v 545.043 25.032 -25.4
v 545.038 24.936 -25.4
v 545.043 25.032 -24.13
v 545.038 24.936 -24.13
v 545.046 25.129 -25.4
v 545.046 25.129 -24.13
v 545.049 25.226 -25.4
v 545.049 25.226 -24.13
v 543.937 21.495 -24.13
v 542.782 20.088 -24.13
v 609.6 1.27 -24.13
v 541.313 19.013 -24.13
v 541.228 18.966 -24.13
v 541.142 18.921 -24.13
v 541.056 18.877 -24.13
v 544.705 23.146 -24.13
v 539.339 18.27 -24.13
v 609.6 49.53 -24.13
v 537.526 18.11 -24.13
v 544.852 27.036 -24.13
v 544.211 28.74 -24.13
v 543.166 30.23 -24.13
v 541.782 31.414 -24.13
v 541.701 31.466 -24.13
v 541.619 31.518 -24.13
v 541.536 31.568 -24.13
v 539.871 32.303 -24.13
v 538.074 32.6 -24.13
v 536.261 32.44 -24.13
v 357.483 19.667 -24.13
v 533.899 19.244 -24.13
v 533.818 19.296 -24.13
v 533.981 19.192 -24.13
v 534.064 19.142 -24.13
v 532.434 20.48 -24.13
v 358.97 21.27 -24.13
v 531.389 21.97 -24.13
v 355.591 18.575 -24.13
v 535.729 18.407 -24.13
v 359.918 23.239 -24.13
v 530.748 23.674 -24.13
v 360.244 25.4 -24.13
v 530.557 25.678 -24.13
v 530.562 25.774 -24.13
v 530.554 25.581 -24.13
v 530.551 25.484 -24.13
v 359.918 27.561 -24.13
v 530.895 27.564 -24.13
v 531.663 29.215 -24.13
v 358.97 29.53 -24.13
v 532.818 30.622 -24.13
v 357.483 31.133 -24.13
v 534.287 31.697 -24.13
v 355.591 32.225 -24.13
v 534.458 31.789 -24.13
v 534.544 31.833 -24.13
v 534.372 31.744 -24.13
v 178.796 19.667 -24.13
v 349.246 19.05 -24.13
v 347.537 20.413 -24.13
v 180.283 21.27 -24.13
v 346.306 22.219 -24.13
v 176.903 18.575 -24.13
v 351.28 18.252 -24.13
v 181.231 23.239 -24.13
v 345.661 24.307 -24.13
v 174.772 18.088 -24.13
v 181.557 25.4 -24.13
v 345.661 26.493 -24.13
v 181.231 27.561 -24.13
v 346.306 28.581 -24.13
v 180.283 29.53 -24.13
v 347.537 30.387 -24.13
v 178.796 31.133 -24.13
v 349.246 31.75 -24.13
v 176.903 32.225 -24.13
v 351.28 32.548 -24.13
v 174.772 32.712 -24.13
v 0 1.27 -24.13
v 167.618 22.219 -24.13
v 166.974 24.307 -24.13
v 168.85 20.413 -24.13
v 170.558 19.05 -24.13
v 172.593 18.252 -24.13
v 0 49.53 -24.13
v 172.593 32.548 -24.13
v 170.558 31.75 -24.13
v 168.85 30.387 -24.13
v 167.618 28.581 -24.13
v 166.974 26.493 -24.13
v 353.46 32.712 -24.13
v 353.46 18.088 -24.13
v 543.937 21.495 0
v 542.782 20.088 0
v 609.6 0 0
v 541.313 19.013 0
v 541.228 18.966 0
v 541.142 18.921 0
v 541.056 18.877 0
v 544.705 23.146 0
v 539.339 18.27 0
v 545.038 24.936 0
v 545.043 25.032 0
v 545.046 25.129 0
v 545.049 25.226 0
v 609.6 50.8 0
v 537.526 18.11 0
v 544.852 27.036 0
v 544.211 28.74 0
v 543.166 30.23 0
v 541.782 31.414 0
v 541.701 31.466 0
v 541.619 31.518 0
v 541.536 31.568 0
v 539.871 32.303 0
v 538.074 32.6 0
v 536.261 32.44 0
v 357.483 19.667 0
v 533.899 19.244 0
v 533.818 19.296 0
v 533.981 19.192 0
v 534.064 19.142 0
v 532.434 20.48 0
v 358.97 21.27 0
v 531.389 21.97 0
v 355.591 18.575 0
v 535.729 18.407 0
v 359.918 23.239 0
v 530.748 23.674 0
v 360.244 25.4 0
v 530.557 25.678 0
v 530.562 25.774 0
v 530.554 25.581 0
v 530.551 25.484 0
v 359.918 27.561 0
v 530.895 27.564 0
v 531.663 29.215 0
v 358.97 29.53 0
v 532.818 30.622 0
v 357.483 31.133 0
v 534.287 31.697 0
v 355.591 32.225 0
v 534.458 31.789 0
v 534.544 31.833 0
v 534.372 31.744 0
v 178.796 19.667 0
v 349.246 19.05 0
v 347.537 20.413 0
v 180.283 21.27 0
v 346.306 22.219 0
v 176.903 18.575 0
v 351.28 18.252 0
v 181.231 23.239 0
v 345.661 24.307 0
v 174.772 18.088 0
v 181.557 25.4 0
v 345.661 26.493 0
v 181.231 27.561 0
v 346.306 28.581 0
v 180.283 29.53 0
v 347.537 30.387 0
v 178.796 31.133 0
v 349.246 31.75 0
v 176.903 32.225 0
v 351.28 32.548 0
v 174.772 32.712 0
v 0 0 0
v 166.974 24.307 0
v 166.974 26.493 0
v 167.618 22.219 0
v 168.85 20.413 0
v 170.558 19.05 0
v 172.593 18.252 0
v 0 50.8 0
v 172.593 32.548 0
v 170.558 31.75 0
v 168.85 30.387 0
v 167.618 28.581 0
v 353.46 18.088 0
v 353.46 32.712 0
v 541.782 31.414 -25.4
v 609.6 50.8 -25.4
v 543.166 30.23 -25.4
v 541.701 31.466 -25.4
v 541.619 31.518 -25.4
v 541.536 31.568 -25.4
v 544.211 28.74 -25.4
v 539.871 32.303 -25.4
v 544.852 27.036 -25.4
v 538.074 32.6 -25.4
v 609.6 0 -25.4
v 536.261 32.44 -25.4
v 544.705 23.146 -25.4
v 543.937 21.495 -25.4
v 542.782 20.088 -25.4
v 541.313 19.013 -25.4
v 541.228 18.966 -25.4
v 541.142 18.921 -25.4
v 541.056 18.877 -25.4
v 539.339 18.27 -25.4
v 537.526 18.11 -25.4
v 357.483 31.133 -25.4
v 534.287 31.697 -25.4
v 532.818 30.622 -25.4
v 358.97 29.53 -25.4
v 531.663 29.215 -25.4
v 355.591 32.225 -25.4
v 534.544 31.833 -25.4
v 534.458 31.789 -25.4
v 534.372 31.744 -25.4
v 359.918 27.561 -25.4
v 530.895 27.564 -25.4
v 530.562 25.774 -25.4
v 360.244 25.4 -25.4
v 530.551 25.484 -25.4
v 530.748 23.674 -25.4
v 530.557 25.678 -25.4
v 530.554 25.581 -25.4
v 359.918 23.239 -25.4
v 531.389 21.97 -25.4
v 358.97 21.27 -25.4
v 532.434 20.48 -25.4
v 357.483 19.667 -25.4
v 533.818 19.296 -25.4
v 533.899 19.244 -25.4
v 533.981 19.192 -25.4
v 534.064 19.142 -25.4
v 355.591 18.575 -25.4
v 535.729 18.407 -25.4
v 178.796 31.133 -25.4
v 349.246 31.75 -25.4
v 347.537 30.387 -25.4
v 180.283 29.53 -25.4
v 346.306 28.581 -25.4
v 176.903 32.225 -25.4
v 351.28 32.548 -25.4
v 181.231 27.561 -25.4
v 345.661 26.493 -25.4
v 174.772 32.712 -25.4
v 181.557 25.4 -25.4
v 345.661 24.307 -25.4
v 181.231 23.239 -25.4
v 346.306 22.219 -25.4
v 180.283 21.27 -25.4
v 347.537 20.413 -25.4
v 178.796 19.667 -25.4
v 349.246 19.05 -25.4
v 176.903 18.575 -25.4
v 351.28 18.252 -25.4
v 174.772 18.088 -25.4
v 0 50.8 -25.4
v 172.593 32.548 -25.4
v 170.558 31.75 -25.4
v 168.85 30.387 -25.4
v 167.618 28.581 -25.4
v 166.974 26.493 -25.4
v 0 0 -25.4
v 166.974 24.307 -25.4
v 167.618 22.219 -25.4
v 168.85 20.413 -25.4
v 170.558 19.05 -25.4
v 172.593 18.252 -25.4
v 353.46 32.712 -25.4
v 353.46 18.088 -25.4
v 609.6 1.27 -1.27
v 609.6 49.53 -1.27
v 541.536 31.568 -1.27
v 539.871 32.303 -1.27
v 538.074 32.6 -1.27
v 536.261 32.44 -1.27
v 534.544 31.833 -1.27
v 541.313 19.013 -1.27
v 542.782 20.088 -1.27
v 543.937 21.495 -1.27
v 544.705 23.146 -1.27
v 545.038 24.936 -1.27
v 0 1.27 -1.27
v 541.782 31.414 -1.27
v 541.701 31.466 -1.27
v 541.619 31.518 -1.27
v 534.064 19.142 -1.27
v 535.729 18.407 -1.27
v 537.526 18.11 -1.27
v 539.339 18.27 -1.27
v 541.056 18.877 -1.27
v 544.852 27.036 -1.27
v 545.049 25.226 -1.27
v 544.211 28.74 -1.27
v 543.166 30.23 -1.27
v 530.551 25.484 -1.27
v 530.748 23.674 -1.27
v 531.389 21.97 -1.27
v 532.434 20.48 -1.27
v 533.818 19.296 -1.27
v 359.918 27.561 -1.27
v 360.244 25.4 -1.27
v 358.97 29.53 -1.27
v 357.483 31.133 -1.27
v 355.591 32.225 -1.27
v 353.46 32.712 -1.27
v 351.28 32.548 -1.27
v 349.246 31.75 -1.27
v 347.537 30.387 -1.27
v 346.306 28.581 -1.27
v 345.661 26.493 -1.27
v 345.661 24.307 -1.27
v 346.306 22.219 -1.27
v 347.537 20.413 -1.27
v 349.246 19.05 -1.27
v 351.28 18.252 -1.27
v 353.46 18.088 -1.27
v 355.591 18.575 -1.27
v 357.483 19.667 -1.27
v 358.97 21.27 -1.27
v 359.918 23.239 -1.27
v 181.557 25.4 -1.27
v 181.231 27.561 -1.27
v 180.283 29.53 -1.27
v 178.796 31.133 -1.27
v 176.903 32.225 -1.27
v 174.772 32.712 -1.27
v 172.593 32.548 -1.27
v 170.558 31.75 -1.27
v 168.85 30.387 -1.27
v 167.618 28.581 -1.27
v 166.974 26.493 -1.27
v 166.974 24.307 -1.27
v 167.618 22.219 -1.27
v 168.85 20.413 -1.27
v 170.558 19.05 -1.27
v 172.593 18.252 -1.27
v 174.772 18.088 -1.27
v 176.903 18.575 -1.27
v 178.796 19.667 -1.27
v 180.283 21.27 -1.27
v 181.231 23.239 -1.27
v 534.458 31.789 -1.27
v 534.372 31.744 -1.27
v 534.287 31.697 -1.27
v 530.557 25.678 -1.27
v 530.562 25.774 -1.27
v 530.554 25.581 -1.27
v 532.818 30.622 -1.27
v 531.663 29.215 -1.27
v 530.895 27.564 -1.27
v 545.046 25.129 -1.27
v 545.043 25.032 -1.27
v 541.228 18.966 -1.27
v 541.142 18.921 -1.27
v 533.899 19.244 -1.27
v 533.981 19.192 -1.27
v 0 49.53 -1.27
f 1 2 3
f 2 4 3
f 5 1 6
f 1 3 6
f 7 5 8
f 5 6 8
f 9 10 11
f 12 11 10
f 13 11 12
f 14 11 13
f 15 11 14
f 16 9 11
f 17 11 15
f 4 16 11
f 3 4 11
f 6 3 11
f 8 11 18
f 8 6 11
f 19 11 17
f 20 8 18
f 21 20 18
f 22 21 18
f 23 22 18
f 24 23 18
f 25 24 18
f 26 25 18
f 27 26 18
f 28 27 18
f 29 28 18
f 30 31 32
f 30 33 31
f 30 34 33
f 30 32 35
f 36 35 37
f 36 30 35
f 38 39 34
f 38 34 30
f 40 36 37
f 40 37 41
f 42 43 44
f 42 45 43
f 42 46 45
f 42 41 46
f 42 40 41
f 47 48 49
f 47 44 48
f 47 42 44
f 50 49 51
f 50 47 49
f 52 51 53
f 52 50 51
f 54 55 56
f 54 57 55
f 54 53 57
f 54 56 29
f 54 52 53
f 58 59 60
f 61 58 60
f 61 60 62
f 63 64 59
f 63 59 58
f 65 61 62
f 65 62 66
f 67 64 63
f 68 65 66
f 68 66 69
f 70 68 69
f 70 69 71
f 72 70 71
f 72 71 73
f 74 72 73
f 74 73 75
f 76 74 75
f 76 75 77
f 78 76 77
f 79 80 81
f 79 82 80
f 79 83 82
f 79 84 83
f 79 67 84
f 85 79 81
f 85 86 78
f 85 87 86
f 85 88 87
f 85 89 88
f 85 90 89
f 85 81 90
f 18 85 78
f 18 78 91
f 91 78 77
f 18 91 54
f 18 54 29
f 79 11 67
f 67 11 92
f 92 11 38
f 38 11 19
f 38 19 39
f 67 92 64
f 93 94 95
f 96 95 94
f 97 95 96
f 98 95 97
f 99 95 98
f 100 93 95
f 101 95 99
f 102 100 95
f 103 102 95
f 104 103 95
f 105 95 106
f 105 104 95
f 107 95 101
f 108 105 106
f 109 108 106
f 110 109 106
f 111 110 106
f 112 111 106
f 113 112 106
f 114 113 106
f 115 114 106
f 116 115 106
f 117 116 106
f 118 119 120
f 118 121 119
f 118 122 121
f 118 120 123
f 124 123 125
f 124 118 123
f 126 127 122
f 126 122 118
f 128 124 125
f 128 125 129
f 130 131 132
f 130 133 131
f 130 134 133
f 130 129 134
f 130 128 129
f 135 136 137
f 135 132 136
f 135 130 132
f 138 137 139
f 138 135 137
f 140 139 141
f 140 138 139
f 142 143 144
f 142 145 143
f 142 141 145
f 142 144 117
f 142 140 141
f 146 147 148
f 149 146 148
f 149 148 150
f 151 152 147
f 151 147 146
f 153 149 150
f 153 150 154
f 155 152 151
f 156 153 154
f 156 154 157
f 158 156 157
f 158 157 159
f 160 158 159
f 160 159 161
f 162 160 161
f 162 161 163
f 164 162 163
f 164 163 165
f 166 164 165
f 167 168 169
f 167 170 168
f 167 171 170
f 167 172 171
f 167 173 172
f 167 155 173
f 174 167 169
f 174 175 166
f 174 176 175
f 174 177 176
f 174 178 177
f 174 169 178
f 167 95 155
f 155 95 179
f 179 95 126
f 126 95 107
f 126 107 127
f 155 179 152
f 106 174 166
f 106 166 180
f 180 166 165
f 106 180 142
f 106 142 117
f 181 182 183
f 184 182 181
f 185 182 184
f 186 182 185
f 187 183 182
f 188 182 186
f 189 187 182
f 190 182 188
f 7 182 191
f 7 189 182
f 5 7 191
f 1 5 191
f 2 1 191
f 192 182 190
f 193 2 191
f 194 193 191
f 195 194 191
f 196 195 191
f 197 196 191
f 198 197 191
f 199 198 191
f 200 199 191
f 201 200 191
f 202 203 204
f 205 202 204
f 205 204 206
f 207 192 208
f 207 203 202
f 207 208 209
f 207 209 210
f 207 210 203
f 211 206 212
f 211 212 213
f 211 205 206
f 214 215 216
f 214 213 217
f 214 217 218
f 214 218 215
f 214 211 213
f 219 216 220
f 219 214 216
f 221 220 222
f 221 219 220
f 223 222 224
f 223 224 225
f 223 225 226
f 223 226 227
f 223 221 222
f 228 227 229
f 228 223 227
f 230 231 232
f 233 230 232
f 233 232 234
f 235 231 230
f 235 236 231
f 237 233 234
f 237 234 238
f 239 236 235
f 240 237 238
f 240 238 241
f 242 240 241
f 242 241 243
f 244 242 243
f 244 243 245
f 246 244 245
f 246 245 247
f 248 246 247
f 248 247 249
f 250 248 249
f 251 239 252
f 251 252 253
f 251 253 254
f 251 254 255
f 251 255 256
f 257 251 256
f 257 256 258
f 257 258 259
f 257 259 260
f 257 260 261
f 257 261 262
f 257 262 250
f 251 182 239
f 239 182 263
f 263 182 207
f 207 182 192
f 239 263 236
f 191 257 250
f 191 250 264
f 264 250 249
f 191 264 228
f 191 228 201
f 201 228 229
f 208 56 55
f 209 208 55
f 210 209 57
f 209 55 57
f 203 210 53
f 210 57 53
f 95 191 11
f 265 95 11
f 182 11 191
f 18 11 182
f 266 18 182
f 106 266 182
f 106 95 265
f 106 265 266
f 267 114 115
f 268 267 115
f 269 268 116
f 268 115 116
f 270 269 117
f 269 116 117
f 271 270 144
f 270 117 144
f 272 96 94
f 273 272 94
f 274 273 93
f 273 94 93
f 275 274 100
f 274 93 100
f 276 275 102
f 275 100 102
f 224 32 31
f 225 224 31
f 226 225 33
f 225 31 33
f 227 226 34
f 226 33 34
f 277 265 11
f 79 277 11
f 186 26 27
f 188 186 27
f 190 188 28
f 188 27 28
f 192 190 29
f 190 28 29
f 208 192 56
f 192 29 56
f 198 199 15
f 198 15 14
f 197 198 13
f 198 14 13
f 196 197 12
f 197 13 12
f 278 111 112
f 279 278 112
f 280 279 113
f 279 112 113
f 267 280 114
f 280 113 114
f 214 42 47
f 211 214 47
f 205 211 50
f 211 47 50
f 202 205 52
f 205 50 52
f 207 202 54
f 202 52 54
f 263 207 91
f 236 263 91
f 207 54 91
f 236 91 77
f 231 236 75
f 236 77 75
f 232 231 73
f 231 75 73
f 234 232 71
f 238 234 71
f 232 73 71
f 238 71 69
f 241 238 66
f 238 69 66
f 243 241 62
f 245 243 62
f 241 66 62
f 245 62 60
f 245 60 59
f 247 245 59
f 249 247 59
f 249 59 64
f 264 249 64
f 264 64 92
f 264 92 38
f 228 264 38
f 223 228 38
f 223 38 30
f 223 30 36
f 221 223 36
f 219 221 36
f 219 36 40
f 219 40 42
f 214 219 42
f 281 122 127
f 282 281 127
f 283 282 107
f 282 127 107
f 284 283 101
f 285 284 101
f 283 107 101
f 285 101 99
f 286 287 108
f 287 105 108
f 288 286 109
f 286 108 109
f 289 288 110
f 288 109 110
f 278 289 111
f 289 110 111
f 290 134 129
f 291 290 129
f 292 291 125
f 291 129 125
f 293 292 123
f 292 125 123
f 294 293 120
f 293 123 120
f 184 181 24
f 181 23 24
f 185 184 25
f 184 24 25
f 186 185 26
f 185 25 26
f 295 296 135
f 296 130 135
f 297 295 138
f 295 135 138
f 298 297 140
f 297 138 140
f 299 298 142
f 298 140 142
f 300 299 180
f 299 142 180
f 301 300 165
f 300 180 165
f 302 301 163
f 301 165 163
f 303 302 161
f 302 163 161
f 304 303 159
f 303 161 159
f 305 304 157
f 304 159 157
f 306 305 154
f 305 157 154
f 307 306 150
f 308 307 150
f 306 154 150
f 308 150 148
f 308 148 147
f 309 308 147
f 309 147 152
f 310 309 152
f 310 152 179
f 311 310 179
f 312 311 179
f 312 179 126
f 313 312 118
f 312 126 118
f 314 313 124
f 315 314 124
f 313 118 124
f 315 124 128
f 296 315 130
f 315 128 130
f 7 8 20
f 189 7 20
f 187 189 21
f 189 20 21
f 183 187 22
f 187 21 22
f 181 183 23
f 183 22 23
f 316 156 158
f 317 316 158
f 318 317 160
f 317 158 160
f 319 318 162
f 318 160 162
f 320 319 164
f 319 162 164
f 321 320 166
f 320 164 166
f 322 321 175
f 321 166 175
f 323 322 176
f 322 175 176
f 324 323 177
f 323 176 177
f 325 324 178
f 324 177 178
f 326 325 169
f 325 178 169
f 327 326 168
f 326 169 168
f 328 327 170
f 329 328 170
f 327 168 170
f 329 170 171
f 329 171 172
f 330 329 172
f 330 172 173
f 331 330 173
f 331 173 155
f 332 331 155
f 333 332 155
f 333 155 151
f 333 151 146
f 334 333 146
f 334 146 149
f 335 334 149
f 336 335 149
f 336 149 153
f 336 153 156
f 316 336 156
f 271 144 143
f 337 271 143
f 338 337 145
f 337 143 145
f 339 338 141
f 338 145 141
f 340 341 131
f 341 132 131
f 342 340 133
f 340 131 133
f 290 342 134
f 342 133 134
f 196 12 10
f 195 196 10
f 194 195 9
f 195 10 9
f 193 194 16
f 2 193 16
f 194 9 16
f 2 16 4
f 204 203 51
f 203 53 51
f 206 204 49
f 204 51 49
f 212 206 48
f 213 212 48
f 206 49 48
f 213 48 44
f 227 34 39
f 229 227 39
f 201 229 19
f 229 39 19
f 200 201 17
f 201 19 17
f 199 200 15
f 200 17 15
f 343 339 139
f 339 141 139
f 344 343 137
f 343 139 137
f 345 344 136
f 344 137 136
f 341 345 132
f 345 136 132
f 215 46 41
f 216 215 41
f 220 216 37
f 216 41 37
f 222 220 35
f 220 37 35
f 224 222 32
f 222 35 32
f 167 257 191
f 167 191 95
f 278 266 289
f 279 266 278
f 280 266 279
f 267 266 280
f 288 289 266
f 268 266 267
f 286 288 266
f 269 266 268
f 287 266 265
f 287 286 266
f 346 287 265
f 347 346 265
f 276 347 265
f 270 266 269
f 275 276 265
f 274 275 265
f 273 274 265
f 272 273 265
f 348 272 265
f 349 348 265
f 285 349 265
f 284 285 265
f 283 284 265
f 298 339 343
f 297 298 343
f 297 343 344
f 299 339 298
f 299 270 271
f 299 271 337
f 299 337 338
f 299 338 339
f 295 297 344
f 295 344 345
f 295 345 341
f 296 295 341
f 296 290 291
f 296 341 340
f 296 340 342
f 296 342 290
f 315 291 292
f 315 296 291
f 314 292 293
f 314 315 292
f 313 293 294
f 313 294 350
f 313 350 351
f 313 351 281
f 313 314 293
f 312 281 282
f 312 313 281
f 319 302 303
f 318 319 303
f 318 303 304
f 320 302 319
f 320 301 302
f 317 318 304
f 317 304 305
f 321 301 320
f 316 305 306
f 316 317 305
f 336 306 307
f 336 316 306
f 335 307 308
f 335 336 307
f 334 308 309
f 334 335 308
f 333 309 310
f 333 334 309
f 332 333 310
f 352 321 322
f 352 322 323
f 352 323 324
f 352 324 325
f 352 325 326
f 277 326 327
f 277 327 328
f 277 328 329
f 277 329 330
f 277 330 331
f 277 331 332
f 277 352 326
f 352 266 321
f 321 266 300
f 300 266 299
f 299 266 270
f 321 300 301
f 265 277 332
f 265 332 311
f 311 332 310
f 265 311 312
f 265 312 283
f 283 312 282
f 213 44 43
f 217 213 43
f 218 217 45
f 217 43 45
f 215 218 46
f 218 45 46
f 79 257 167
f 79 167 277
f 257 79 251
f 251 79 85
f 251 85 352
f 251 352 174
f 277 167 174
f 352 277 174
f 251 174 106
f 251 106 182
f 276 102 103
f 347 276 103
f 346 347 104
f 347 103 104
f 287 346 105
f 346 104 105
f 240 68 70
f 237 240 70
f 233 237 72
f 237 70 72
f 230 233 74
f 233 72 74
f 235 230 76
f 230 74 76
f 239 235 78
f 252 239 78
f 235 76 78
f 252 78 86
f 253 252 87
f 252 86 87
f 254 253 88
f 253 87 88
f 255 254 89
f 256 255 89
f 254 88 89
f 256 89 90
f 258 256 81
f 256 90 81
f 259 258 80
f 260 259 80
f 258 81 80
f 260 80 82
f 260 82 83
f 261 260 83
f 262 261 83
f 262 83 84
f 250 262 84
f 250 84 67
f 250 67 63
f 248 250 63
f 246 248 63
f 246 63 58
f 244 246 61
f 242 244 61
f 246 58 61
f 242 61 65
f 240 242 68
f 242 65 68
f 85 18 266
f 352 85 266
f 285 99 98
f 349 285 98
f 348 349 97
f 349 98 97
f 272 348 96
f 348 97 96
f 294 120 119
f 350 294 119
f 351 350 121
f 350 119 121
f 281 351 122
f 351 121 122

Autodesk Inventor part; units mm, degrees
ref_plane "YZ Plane" through (0, 0, 0) normal (1, 0, 0) x (0, 1, 0)
ref_plane "XZ Plane" through (0, 0, 0) normal (0, 1, 0) x (-1, 0, 0)
ref_plane "XY Plane" through (0, 0, 0) normal (0, 0, 1) x (1, 0, 0)
sketch "Sketch1" plane through (0, 0, 0) normal (1, 0, 0) x (0, 1, 0)
  line L0 (0, 0) -> (50.8, 0)
  line L1 (50.8, 0) -> (50.8, -25.4)
  line L2 (50.8, -25.4) -> (0, -25.4)
  line L3 (0, -25.4) -> (0, 0)
  line L4 (49.53, -24.13) -> (49.53, -1.27)
  line L5 (49.53, -1.27) -> (1.27, -1.27)
  line L6 (1.27, -1.27) -> (1.27, -24.13)
  line L7 (1.27, -24.13) -> (49.53, -24.13)
  dimension "d0" = 50.8
  dimension "d1" = 25.4
  dimension "d2" = 1.27
extrude "Extrusion1" add sketch "Sketch1" along normal blind 609.6
sketch "Sketch2" plane through (0, 0, 0) normal (0, 0, 1) x (1, 0, 0)
  line L0 (537.5598, 19.0095) -> (541.0559, 18.8772) projected
  line L1 (534.0637, 19.1419) -> (537.5598, 19.0095) projected
  line L2 (532.1846, 22.3903) -> (533.818, 19.2964) projected
  arc A0 (533.818, 19.2964) -> (534.0637, 19.1419) centre (537.8, 25.355) ccw projected
  arc A1 (530.5621, 25.7742) -> (530.5512, 25.4841) centre (537.8, 25.355) ccw projected
  arc A2 (534.5441, 31.8328) -> (534.2874, 31.6973) centre (537.8, 25.355) ccw projected
  arc A3 (541.782, 31.4136) -> (541.5363, 31.5681) centre (537.8, 25.355) ccw projected
  arc A4 (545.0379, 24.9358) -> (545.0488, 25.2259) centre (537.8, 25.355) ccw projected
  arc A5 (541.0559, 18.8772) -> (541.3126, 19.0127) centre (537.8, 25.355) ccw projected
  circle A6 centre (537.8, 25.355) radius 7.25
  point P0 (0, 0)
extrude "Extrusion2" cut sketch "Sketch2" against normal through all
sketch "Sketch4" plane through (0, 0, 0) normal (0, 0, 1) x (1, 0, 0)
  circle A0 centre (352.9118, 25.4) radius 7.3323
  circle A1 centre (174.2245, 25.4) radius 7.3323
  point P0 (0, 0)
extrude "Extrusion4" cut sketch "Sketch4" against normal through all
properties part number "Aluminum Channel Arm"
